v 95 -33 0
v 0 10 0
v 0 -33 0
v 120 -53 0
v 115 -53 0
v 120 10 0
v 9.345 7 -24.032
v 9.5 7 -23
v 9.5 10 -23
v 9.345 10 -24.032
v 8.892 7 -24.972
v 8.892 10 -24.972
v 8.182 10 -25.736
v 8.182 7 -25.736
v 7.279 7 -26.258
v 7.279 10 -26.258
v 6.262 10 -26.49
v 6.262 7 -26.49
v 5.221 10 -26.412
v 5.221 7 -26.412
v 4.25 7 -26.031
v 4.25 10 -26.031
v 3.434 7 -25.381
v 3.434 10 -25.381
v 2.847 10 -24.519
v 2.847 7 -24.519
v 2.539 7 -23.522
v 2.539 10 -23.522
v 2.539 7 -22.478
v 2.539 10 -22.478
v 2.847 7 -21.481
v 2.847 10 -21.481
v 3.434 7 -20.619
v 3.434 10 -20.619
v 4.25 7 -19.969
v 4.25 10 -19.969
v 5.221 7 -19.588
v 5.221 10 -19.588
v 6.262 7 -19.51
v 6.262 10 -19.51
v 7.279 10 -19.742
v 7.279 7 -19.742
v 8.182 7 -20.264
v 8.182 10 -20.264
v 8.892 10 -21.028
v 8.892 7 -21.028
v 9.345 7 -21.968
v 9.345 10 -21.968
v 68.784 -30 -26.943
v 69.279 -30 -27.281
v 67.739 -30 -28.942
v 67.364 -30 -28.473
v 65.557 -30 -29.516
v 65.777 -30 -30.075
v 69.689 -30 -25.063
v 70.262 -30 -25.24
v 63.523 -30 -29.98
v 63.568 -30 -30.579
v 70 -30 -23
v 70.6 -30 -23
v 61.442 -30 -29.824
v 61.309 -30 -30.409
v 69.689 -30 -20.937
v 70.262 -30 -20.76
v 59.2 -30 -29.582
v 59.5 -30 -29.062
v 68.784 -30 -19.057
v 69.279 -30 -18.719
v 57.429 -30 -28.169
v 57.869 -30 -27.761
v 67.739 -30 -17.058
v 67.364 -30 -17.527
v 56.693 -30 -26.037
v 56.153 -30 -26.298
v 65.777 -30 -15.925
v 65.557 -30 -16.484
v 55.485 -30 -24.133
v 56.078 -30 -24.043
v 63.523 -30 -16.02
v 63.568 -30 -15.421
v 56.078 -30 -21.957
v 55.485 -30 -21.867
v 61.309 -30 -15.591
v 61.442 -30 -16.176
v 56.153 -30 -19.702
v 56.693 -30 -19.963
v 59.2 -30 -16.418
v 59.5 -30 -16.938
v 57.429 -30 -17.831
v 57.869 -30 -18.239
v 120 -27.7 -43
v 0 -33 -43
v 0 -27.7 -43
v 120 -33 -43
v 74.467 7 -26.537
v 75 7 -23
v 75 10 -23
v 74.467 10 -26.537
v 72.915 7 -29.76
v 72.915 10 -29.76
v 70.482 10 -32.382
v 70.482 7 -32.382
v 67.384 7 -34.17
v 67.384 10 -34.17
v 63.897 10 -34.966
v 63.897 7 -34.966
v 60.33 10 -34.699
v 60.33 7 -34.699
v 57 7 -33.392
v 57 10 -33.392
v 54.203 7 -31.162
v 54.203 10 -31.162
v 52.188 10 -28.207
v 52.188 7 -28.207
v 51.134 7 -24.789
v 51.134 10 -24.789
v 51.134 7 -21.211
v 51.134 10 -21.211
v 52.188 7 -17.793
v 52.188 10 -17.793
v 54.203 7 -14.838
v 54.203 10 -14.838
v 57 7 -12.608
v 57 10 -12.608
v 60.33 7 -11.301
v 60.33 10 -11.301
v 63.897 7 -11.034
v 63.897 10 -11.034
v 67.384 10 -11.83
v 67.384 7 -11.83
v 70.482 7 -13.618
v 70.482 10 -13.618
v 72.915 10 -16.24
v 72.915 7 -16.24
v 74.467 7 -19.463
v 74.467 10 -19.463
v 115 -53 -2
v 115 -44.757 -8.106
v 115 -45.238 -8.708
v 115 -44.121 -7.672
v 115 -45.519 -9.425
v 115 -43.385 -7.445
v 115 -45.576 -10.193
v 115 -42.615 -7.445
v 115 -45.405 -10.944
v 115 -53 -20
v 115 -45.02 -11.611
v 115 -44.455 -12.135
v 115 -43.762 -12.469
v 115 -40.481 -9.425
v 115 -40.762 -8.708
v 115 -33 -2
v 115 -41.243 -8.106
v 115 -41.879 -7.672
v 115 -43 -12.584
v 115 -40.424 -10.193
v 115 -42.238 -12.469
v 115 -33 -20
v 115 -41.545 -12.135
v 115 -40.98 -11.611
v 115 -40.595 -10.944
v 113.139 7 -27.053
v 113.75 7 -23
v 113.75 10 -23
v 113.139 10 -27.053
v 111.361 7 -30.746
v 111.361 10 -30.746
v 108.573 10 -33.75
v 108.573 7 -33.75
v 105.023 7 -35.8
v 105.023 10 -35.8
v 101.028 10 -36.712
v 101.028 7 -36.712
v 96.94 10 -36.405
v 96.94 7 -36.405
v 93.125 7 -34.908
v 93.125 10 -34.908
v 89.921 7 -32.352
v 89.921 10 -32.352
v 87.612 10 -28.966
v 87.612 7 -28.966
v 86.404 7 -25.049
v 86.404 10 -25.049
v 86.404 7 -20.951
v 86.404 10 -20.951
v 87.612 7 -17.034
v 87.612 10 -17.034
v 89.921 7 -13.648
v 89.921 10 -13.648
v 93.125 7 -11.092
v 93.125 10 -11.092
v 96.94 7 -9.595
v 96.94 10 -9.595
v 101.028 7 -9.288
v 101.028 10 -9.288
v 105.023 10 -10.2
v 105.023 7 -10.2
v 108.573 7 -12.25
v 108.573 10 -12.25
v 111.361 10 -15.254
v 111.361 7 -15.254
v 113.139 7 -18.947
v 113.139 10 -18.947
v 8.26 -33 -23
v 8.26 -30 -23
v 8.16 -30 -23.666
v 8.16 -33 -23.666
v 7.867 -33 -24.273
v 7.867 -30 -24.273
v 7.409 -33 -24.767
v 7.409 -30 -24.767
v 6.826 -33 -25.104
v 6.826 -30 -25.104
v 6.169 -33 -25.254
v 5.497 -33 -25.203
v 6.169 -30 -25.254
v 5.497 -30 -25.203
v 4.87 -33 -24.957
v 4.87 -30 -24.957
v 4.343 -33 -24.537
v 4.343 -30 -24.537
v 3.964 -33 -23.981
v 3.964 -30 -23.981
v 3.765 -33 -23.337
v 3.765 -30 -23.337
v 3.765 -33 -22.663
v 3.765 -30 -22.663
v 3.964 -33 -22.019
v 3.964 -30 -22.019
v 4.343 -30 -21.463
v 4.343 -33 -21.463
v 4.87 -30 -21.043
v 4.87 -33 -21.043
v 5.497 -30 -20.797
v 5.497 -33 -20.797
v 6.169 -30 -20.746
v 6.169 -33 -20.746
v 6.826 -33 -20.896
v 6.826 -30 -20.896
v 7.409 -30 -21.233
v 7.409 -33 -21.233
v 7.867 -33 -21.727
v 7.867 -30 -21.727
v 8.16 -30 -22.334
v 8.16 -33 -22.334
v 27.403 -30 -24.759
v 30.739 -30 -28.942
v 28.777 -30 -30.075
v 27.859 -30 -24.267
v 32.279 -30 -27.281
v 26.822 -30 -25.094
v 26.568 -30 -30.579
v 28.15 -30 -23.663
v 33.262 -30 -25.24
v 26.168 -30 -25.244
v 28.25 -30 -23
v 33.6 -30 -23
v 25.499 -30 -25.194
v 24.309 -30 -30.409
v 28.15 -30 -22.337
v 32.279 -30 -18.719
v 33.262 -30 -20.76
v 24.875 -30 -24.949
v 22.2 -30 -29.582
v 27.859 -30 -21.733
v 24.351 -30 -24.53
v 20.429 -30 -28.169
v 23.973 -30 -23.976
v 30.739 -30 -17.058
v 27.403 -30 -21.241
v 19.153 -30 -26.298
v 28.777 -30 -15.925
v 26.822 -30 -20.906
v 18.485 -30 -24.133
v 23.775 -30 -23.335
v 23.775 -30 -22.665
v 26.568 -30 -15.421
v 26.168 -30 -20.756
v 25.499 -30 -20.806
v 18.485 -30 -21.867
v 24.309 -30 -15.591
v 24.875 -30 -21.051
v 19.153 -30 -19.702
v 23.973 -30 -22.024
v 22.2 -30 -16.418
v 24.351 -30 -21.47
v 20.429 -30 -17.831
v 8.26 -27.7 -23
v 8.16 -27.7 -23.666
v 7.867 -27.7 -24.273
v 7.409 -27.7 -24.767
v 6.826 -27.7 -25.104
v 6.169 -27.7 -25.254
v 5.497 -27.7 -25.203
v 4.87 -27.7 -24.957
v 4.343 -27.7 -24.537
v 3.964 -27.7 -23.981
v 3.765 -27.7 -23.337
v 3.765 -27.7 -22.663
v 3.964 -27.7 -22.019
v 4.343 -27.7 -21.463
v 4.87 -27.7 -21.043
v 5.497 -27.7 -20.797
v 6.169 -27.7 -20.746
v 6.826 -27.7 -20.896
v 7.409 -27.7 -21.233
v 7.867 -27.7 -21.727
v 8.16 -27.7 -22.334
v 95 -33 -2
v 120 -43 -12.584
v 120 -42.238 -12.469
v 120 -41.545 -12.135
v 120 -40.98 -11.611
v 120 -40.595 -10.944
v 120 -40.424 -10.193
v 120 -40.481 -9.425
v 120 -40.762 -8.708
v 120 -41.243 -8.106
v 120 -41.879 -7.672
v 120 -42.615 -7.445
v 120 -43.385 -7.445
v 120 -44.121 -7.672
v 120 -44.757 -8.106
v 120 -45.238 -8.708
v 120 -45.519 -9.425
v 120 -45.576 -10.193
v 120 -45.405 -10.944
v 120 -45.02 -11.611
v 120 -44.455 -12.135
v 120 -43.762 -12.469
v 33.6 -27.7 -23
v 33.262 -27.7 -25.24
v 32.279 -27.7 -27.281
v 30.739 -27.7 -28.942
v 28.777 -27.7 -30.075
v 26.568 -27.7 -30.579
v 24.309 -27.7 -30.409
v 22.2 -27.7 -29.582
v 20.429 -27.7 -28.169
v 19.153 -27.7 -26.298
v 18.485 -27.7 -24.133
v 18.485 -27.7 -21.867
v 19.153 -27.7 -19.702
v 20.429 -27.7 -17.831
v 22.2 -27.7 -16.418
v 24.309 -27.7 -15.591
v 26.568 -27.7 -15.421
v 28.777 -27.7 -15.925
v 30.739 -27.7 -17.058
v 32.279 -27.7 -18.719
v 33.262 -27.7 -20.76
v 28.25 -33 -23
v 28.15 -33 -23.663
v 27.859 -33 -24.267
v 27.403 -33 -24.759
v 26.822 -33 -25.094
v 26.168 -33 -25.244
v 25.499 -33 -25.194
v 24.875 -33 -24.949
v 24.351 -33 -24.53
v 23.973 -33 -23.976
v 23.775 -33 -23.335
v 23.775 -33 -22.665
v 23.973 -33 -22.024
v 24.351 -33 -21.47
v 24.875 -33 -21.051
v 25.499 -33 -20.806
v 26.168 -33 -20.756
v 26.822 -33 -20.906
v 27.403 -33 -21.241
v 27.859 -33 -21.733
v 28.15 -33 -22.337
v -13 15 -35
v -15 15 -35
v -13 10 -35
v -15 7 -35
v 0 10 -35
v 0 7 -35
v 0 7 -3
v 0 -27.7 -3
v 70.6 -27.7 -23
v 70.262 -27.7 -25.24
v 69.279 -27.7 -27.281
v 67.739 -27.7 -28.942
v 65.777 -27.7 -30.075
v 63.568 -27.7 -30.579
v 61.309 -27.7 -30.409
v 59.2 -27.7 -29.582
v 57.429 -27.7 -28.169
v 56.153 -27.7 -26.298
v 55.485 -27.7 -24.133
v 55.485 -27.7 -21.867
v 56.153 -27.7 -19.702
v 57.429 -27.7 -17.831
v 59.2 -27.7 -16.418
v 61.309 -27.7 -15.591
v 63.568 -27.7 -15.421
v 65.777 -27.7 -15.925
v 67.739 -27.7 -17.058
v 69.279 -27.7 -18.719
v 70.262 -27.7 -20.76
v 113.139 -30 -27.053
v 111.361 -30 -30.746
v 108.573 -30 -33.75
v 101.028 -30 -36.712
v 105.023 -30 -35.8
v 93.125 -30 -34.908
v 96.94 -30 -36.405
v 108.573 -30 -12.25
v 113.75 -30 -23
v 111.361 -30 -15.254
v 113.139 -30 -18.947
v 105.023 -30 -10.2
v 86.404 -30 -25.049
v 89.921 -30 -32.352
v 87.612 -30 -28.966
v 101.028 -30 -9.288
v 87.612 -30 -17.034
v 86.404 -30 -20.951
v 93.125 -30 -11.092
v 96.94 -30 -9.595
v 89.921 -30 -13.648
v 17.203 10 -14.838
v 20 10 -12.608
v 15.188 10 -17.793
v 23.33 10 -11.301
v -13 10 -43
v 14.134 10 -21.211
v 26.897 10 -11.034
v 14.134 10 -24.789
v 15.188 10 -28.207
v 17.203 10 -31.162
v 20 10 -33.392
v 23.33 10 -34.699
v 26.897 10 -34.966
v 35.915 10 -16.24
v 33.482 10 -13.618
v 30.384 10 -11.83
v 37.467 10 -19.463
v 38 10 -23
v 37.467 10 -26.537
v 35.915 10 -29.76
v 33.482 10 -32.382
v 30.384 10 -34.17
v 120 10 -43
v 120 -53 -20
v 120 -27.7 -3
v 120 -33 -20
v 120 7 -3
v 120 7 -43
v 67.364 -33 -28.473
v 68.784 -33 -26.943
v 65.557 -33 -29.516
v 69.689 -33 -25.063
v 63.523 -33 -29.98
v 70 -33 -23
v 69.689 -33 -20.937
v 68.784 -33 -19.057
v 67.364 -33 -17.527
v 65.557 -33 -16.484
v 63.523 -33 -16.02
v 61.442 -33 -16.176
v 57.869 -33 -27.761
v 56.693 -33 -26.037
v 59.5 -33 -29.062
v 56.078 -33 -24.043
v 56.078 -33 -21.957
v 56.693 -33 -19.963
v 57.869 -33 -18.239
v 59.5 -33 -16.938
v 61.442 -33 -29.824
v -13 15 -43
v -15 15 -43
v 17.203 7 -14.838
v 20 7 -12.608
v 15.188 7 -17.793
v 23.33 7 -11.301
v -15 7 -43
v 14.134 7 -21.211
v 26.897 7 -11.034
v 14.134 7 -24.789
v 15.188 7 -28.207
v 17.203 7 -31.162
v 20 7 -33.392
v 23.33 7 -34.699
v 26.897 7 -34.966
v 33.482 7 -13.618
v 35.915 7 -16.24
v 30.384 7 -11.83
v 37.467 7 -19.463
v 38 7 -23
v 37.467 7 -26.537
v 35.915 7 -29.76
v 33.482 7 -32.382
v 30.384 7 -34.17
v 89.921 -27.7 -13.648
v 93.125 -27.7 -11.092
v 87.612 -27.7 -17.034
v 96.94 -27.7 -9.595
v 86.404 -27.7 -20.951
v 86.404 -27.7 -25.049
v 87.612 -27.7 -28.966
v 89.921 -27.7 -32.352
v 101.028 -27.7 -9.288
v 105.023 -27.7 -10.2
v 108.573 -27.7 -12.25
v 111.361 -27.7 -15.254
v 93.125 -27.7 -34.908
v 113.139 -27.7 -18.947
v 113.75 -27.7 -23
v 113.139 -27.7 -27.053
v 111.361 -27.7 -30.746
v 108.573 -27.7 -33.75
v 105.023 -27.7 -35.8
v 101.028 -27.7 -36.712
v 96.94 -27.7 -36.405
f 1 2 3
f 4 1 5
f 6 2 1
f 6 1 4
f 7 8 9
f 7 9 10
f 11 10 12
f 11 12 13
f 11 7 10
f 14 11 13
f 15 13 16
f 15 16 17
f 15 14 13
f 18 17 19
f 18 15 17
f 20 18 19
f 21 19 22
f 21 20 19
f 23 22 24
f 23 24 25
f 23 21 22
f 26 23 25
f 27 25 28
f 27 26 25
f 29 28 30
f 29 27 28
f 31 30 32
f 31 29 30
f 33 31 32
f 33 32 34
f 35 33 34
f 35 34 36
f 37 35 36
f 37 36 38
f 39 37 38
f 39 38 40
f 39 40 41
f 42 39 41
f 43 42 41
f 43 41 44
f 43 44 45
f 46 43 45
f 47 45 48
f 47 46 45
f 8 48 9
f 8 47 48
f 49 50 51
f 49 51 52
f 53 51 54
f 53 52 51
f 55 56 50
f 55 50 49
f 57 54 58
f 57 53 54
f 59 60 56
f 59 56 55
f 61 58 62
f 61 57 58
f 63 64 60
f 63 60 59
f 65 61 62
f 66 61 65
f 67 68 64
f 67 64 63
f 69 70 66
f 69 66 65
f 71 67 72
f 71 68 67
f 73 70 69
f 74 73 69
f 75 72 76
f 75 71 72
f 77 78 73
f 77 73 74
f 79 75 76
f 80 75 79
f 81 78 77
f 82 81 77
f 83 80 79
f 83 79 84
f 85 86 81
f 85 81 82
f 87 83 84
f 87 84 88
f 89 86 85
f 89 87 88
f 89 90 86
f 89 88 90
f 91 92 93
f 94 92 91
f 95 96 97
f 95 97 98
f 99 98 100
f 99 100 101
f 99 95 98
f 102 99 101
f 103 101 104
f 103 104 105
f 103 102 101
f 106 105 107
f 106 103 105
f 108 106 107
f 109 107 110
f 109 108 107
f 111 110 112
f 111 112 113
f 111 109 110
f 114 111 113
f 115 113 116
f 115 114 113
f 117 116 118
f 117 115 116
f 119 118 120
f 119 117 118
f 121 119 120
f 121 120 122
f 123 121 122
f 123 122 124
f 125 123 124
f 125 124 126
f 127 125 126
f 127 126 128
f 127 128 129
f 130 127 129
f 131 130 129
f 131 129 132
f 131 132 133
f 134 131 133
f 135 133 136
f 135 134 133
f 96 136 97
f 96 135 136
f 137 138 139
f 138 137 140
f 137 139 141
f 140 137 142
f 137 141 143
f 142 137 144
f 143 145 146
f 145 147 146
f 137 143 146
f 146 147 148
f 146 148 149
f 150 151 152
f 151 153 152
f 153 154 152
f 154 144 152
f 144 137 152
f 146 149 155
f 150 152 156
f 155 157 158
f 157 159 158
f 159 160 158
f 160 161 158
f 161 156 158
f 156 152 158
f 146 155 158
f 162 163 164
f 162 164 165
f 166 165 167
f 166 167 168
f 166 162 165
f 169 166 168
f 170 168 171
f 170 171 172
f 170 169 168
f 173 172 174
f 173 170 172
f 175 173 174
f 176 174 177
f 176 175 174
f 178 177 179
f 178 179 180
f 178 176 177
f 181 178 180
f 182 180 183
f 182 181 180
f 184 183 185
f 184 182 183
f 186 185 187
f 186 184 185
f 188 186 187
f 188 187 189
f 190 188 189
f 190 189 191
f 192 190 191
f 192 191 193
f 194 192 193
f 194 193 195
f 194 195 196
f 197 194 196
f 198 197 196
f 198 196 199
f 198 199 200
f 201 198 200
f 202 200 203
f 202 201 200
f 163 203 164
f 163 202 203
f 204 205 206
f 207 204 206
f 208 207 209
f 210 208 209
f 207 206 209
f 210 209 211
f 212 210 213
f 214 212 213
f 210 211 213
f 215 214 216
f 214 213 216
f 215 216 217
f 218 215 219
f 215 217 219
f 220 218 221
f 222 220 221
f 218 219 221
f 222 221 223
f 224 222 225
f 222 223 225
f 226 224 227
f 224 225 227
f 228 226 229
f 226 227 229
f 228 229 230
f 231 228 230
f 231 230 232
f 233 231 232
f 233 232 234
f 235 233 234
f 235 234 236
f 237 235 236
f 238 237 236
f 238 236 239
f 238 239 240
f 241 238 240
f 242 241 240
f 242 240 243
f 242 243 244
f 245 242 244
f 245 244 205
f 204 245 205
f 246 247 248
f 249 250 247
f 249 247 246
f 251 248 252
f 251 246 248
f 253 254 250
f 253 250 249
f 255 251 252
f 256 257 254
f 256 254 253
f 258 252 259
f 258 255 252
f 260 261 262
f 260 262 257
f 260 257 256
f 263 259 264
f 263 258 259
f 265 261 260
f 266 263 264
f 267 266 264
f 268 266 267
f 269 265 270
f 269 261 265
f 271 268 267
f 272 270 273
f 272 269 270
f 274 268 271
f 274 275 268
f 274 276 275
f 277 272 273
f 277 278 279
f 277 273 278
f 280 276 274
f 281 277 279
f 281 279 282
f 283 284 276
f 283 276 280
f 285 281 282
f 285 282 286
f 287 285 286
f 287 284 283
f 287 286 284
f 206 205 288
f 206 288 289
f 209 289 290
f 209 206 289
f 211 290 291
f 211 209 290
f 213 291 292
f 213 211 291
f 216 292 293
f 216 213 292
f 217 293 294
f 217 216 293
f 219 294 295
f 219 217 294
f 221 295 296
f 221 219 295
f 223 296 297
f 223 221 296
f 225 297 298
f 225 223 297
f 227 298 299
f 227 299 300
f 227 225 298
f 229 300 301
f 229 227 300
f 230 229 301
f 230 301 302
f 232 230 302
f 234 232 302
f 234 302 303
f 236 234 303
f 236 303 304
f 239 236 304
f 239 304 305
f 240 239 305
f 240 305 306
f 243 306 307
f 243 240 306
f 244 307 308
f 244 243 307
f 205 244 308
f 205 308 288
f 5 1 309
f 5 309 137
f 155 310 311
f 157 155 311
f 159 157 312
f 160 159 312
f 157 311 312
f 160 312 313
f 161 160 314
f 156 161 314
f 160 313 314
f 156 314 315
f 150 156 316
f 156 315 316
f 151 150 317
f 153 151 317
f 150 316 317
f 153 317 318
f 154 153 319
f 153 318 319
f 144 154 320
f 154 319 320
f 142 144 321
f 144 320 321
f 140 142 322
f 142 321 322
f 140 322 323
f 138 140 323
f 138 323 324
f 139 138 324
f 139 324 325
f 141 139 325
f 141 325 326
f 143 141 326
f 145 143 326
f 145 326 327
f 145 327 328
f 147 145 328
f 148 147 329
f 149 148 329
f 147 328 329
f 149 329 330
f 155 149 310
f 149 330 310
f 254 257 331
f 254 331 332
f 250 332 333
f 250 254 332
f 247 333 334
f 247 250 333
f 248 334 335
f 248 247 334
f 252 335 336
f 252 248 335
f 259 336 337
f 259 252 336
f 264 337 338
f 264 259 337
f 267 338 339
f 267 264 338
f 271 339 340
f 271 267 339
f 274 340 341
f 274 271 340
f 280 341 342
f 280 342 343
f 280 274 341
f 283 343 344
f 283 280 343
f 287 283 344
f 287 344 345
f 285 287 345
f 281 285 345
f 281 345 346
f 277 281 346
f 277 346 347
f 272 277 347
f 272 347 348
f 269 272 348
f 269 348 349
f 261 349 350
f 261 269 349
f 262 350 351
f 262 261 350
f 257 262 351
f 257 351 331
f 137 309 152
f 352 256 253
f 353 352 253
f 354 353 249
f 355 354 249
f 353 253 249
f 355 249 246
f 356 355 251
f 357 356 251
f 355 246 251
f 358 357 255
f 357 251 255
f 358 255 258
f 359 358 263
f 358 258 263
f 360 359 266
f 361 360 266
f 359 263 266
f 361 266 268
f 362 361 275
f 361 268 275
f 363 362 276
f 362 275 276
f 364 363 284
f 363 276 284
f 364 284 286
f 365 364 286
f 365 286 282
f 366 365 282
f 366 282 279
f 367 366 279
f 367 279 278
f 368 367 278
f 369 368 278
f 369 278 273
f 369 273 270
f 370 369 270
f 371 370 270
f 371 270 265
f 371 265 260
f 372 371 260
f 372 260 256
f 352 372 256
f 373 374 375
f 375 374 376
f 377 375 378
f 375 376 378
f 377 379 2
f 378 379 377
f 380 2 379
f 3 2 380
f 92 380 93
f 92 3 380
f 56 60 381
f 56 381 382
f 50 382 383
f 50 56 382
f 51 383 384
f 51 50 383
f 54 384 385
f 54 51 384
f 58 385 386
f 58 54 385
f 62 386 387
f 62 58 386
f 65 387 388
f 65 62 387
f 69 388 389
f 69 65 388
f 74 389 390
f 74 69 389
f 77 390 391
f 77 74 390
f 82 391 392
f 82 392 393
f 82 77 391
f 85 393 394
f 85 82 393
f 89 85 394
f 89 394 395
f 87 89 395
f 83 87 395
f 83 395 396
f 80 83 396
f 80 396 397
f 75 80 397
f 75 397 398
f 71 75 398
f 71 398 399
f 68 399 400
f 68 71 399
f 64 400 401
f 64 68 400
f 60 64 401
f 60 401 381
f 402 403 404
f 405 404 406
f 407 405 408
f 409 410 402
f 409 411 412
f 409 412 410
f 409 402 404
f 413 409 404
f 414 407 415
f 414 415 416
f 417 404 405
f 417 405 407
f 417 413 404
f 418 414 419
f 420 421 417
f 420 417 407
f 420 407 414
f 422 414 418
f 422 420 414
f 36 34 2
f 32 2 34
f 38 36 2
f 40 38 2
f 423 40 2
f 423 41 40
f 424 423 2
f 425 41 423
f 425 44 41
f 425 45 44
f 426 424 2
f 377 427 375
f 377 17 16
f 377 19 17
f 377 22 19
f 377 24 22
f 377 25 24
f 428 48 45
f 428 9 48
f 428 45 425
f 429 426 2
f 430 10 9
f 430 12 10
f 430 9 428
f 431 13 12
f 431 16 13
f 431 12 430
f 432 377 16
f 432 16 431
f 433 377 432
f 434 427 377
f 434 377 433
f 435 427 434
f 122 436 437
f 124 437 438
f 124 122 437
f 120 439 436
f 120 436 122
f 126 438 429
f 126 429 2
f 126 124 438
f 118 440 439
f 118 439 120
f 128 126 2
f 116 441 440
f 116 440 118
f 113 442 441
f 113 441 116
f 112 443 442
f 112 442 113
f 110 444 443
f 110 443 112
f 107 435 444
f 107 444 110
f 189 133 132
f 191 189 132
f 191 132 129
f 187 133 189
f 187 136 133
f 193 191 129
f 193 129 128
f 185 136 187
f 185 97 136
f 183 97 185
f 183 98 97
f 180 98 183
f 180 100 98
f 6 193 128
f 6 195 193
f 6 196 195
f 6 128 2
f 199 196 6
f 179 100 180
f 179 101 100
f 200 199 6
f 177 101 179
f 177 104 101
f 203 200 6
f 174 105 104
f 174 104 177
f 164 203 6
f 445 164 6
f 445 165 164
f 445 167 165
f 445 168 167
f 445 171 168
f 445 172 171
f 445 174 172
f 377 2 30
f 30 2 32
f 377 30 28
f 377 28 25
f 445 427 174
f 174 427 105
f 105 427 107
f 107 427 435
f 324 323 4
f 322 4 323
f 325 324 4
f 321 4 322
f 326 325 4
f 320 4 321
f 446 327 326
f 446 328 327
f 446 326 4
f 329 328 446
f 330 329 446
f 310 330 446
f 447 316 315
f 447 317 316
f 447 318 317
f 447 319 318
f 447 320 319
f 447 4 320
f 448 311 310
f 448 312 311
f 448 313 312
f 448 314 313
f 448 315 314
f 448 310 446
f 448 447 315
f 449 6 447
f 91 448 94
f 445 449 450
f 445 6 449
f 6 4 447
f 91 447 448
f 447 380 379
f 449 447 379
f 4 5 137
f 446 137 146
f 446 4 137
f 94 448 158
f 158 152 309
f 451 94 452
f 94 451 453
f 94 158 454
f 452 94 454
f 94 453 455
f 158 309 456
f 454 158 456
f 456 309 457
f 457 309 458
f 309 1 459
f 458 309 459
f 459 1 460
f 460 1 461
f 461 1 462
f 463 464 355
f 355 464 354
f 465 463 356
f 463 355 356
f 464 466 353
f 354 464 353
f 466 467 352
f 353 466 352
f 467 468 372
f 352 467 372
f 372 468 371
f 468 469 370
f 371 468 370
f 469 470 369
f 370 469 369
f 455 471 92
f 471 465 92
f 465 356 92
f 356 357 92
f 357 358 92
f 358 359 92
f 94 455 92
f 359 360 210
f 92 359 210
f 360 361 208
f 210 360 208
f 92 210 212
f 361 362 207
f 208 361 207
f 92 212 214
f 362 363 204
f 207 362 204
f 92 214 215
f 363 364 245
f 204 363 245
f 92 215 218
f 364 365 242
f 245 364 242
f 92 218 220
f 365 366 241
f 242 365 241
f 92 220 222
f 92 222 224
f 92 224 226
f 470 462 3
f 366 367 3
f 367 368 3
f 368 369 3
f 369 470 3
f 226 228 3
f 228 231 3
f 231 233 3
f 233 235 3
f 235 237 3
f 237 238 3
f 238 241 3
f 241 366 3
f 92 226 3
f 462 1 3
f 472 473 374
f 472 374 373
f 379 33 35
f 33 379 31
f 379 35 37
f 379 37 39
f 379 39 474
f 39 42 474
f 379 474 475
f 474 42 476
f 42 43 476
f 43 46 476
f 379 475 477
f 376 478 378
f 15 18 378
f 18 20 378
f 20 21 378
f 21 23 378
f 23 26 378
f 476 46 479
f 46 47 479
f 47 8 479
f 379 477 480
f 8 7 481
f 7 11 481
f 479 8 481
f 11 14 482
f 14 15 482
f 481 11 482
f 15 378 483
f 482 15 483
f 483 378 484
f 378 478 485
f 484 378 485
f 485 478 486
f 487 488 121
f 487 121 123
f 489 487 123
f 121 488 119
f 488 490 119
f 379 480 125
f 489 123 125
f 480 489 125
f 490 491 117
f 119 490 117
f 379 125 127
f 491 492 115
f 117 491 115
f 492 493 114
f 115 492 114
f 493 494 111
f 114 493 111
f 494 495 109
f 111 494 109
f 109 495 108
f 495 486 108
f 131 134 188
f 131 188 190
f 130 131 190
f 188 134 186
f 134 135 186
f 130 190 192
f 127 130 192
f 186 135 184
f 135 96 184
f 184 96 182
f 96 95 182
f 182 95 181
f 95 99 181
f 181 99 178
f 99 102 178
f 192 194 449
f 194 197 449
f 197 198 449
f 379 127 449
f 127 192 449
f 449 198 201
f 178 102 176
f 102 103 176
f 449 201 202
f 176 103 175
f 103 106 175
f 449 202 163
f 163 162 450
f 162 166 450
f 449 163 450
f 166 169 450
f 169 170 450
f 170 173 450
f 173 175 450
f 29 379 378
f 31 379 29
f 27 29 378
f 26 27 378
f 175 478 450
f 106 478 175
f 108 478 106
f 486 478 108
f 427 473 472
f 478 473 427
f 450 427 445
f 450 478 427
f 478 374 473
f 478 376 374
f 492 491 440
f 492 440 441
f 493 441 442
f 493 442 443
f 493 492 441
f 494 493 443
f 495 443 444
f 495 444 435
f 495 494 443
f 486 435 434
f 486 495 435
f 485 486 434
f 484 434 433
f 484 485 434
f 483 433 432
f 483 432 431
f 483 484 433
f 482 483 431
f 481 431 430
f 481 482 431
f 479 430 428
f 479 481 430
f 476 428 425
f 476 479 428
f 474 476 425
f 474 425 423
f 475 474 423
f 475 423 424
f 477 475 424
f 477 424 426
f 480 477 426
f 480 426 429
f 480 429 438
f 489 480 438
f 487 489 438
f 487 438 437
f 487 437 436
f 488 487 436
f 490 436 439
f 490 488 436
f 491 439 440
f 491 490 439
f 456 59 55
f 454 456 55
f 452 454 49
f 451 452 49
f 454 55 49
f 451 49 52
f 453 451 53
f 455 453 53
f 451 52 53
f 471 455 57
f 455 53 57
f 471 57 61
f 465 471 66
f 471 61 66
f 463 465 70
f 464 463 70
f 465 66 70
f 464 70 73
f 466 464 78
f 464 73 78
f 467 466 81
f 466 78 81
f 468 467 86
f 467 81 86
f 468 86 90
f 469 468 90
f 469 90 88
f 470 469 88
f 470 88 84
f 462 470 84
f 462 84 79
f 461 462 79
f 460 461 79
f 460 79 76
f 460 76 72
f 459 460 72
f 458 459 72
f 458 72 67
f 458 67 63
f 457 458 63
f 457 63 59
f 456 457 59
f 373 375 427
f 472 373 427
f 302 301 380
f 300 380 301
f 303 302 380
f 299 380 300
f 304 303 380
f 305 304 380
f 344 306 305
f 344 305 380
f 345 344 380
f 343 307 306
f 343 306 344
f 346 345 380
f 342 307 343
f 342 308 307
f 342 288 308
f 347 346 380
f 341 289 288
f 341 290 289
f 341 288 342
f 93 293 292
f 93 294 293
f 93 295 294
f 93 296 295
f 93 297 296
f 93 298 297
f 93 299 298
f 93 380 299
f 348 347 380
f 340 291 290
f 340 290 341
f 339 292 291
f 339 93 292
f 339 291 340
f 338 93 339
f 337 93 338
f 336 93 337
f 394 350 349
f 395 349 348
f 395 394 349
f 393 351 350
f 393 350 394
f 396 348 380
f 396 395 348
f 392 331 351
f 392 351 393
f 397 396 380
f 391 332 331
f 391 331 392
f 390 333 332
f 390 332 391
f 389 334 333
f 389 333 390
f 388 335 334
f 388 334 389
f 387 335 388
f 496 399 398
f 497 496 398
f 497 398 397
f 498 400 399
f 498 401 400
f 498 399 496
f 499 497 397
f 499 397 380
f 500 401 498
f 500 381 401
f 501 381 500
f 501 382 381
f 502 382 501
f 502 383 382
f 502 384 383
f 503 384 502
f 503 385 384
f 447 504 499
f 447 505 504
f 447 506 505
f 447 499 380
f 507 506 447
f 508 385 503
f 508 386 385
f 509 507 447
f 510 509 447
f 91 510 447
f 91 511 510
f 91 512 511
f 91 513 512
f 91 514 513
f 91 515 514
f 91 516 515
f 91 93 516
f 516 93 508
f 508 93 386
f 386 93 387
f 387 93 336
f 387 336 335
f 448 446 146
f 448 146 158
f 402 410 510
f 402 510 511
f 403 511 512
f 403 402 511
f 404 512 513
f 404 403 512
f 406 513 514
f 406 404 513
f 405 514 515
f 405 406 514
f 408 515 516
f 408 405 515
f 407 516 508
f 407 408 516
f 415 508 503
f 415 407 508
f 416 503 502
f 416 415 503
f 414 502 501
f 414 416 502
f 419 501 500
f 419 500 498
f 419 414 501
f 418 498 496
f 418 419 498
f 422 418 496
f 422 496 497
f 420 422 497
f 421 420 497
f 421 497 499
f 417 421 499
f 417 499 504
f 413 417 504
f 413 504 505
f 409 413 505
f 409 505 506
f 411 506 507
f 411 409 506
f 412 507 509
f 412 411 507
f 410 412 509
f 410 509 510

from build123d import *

# Parameters (mm, degrees)
SKETCH1_W           = 3
SKETCH1_H           = 40
BOSS_EXTRUDE1_DEPTH = 120
SKETCH9_W           = 120
SKETCH9_H           = 3
BOSS_EXTRUDE2_DEPTH = 40
SKETCH10_W          = 120
SKETCH10_H          = 40
SKETCH10_R          = 13.75
SKETCH10_R_2        = 7.6
SKETCH10_R_3        = 2.26
BOSS_EXTRUDE3_DEPTH = 2.3
SKETCH11_R          = 7
SKETCH11_R_2        = 2.25
SKETCH11_R_3        = 2.26
CUT_EXTRUDE5_DEPTH  = 4
SKETCH12_W          = 120
SKETCH12_H          = 43
SKETCH12_R          = 3.5
SKETCH12_R_2        = 12
SKETCH12_R_3        = 13.75
BOSS_EXTRUDE4_DEPTH = 3
SKETCH13_W          = 20
SKETCH13_H          = 20
SKETCH13_R          = 2.583718127
BOSS_EXTRUDE5_DEPTH = 5
BOSS_EXTRUDE6_DEPTH = 2
SKETCH15_W          = 15
SKETCH15_H          = 8
BOSS_EXTRUDE7_DEPTH = 3
SKETCH16_W          = 2
SKETCH16_H          = 8
BOSS_EXTRUDE8_DEPTH = 5


with BuildPart() as part:
    # Sketch1 → Boss-Extrude1 (new body)
    with BuildSketch(Plane(origin=(0, 0, 0), x_dir=(0, 0, -1), z_dir=(1, 0, 0))):
        with Locations((1.5, -13)):
            Rectangle(SKETCH1_W, SKETCH1_H)
    extrude(amount=BOSS_EXTRUDE1_DEPTH)

    # Sketch9 → Boss-Extrude2 (add)
    with BuildSketch(Plane(origin=(0, 0, -3), x_dir=(-1, 0, 0), z_dir=(0, 0, -1))):
        with Locations((-60, -31.5)):
            Rectangle(SKETCH9_W, SKETCH9_H)
    extrude(amount=BOSS_EXTRUDE2_DEPTH)

    # Sketch10 → Boss-Extrude3 (add)
    with BuildSketch(Plane(origin=(0, -30, 0), x_dir=(1, 0, 0), z_dir=(0, 1, 0))):
        with Locations((60, 23)):
            Rectangle(SKETCH10_W, SKETCH10_H)
        with Locations((100, 23)):
            Circle(SKETCH10_R, mode=Mode.SUBTRACT)
        with Locations((63, 23)):
            Circle(SKETCH10_R_2, mode=Mode.SUBTRACT)
        with Locations((26, 23)):
            Circle(SKETCH10_R_2, mode=Mode.SUBTRACT)
        with Locations((6, 23)):
            Circle(SKETCH10_R_3, mode=Mode.SUBTRACT)
    extrude(amount=BOSS_EXTRUDE3_DEPTH)

    # Sketch11 → Cut-Extrude5 (cut, through all)
    with BuildSketch(Plane(origin=(0, -30, 0), x_dir=(1, 0, 0), z_dir=(0, 1, 0))):
        with Locations((63, 23)):
            Circle(SKETCH11_R)
        with Locations((26, 23)):
            Circle(SKETCH11_R_2)
        with Locations((6, 23)):
            Circle(SKETCH11_R_3)
    extrude(amount=-CUT_EXTRUDE5_DEPTH, mode=Mode.SUBTRACT)

    # Sketch12 → Boss-Extrude4 (add)
    with BuildSketch(Plane(origin=(0, 7, 0), x_dir=(1, 0, 0), z_dir=(0, 1, 0))):
        with Locations((60, 21.5)):
            Rectangle(SKETCH12_W, SKETCH12_H)
        with Locations((6, 23)):
            Circle(SKETCH12_R, mode=Mode.SUBTRACT)
        with Locations((26, 23)):
            Circle(SKETCH12_R_2, mode=Mode.SUBTRACT)
        with Locations((63, 23)):
            Circle(SKETCH12_R_2, mode=Mode.SUBTRACT)
        with Locations((100, 23)):
            Circle(SKETCH12_R_3, mode=Mode.SUBTRACT)
    extrude(amount=BOSS_EXTRUDE4_DEPTH)

    # Sketch13 → Boss-Extrude5 (add)
    with BuildSketch(Plane(origin=(120, 0, 0), x_dir=(0, 0, -1), z_dir=(1, 0, 0))):
        with Locations((10, -43)):
            Rectangle(SKETCH13_W, SKETCH13_H)
        with Locations((10, -43)):
            Circle(SKETCH13_R, mode=Mode.SUBTRACT)
    extrude(amount=-BOSS_EXTRUDE5_DEPTH)

    # Sketch14 → Boss-Extrude6 (add)
    with BuildSketch(Plane.XY):
        Polygon((115, -53), (115, -33), (95, -33), align=None)
    extrude(amount=-BOSS_EXTRUDE6_DEPTH)

    # Sketch15 → Boss-Extrude7 (add)
    with BuildSketch(Plane(origin=(0, 10, 0), x_dir=(1, 0, 0), z_dir=(0, 1, 0))):
        with Locations((-7.5, 39)):
            Rectangle(SKETCH15_W, SKETCH15_H)
    extrude(amount=-BOSS_EXTRUDE7_DEPTH)

    # Sketch16 → Boss-Extrude8 (add)
    with BuildSketch(Plane(origin=(0, 10, 0), x_dir=(1, 0, 0), z_dir=(0, 1, 0))):
        with Locations((-14, 39)):
            Rectangle(SKETCH16_W, SKETCH16_H)
    extrude(amount=BOSS_EXTRUDE8_DEPTH)


solid = part.part
